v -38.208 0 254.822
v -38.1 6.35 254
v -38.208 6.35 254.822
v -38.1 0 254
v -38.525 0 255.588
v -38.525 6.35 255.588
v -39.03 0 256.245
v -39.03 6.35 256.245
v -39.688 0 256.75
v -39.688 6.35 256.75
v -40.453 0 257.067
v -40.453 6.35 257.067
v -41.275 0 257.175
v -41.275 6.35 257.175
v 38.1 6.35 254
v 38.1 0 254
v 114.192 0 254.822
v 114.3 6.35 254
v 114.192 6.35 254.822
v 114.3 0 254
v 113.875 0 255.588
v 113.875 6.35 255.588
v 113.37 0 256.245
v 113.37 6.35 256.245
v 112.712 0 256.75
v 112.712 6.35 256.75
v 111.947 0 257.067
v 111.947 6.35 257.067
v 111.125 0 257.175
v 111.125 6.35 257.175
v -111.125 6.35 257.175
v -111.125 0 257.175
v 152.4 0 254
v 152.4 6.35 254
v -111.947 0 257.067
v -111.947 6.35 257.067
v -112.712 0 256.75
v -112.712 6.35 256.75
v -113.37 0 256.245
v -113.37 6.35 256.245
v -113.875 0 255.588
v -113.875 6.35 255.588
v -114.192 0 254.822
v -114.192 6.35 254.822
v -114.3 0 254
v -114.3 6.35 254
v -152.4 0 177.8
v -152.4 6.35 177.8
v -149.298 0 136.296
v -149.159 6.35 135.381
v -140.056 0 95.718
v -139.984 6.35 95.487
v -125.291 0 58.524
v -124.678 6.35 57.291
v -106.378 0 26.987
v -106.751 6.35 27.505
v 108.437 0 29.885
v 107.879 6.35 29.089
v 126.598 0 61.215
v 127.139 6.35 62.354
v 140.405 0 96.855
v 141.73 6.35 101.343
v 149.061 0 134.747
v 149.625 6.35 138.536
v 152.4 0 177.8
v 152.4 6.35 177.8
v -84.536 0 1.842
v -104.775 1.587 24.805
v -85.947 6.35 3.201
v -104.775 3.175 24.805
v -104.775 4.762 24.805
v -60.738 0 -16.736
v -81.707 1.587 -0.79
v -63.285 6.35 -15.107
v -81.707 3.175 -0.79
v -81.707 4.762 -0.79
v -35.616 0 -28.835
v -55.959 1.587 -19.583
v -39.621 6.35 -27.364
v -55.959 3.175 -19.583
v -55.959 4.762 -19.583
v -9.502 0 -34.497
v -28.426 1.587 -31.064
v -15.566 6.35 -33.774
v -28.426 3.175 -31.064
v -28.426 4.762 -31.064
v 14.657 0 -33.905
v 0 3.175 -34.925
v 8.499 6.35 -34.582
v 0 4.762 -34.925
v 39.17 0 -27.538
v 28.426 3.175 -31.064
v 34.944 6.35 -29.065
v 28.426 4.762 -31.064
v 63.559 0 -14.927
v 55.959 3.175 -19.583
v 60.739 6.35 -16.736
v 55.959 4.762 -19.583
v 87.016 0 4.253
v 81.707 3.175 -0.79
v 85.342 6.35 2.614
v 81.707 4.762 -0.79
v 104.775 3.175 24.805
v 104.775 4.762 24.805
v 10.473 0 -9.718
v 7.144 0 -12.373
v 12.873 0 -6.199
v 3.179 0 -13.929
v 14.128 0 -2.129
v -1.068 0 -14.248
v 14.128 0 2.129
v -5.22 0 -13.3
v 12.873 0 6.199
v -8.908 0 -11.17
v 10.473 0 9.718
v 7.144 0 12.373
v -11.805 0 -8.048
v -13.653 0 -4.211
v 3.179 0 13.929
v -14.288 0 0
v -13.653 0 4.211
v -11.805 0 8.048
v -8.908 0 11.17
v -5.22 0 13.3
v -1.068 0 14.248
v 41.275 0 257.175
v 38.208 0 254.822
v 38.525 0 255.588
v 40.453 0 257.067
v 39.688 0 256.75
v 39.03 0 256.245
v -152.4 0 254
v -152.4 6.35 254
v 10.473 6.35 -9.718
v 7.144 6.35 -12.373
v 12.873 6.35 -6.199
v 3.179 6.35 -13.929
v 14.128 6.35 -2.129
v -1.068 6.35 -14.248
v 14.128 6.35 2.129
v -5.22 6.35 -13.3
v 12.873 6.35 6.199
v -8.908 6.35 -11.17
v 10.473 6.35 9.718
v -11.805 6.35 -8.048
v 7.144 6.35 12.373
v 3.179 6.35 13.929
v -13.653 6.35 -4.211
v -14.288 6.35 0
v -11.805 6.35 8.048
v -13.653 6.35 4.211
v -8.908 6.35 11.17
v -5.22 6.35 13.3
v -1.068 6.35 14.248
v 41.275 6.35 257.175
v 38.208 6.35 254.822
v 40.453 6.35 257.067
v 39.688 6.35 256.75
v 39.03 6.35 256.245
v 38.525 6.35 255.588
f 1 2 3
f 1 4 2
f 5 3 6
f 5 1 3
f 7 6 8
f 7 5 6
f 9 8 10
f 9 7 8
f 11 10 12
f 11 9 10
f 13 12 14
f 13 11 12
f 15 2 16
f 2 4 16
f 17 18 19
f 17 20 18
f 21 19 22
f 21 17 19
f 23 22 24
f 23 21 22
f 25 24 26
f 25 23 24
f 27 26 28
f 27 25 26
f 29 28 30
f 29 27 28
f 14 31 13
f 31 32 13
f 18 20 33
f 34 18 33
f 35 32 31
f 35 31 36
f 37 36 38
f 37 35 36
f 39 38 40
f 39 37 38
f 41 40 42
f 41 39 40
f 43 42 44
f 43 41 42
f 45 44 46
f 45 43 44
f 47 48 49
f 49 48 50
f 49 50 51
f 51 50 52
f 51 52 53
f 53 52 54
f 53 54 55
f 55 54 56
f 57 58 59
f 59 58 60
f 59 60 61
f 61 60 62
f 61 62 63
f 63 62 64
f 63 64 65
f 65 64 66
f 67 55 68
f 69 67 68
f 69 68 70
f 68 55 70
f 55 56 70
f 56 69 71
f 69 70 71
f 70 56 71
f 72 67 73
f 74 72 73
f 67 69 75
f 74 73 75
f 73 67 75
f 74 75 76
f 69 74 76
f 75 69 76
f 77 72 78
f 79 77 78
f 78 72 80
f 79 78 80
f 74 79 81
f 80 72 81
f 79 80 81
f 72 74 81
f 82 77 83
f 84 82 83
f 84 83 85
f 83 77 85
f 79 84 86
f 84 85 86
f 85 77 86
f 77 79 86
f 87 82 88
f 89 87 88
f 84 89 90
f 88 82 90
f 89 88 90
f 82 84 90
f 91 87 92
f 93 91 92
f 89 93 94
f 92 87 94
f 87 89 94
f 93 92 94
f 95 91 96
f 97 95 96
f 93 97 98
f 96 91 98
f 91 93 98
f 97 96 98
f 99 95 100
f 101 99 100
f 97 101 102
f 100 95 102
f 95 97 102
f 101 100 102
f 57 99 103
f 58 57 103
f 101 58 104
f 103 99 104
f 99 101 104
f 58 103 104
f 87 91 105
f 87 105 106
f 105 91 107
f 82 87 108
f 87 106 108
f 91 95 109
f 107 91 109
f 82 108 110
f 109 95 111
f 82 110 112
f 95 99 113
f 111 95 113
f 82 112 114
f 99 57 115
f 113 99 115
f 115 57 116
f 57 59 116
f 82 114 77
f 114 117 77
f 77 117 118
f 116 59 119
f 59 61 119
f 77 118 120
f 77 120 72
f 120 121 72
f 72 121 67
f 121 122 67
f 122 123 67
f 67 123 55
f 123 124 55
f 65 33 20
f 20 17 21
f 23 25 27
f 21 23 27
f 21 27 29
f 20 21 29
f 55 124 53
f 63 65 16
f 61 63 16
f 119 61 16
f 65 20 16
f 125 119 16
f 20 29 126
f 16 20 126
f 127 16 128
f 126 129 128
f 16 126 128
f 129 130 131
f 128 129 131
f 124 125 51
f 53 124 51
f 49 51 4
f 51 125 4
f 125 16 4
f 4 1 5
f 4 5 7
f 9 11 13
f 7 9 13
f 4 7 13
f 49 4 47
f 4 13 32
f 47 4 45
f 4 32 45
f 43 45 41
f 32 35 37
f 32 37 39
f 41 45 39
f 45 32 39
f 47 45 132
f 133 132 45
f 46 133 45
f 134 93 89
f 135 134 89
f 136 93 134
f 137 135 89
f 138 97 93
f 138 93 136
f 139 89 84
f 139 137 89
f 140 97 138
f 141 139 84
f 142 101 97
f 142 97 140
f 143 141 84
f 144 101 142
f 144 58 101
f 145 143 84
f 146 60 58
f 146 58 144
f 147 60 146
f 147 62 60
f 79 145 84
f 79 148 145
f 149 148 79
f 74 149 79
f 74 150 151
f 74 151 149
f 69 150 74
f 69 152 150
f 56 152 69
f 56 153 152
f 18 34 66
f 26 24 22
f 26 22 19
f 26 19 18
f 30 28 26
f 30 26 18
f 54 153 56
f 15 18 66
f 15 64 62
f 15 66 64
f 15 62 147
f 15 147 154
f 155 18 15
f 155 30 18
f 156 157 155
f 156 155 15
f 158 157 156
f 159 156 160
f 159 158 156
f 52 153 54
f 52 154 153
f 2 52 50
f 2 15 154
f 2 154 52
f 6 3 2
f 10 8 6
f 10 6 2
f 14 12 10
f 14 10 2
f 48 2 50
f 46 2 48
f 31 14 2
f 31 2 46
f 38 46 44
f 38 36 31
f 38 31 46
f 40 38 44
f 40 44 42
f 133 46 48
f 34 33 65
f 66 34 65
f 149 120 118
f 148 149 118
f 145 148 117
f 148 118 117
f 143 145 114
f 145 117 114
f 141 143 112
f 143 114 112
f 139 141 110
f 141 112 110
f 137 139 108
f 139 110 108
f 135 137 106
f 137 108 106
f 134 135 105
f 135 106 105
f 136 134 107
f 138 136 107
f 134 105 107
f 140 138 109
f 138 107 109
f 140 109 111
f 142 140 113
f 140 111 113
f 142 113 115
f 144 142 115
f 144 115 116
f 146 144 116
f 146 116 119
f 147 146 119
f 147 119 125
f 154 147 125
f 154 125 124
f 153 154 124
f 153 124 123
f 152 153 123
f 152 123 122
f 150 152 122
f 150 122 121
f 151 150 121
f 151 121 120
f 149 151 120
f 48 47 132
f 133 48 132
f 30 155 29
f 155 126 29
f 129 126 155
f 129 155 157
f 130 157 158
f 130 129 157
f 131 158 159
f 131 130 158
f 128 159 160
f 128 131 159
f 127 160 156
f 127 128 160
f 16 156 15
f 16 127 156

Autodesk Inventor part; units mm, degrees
ref_plane "YZ Plane" through (0, 0, 0) normal (1, 0, 0) x (0, 1, 0)
ref_plane "XZ Plane" through (0, 0, 0) normal (0, 1, 0) x (-1, 0, 0)
ref_plane "XY Plane" through (0, 0, 0) normal (0, 0, 1) x (1, 0, 0)
sketch "Sketch1" plane through (0, 0, 0) normal (0, 1, 0) x (-1, 0, 0)
  line L0 (0, -234.315) -> (0, 339.09) projected
  line L1 (-213.36, 0) -> (213.36, 0) projected
  line L2 (213.36, 0) -> (-213.36, 0) projected
  line L3 (0, -234.315) -> (0, 339.09) projected
  line L4 (152.4, 254) -> (-152.4, 254)
  line L5 (-152.4, 254) -> (-152.4, 0)
  line L6 (152.4, 0) -> (152.4, 254)
  arc A0 (-152.4, 0) -> (152.4, 0) centre (0, 0) ccw
  line L7 (111.125, 254) -> (41.275, 254) construction
  line L8 (111.125, 257.175) -> (41.275, 257.175)
  line L9 (41.275, 250.825) -> (111.125, 250.825)
  arc A1 (111.125, 250.825) -> (111.125, 257.175) centre (111.125, 254) ccw
  arc A2 (41.275, 257.175) -> (41.275, 250.825) centre (41.275, 254) ccw
  line L10 (-41.275, 254) -> (-111.125, 254) construction
  line L11 (-41.275, 257.175) -> (-111.125, 257.175)
  line L12 (-111.125, 250.825) -> (-41.275, 250.825)
  arc A3 (-41.275, 250.825) -> (-41.275, 257.175) centre (-41.275, 254) ccw
  arc A4 (-111.125, 257.175) -> (-111.125, 250.825) centre (-111.125, 254) ccw
  circle A5 centre (0, 0) radius 14.2875
  point P0 (76.2, 254)
  point P1 (-76.2, 254)
  point P2 (0, -152.4)
  point P3 (114.3, 254)
  point P4 (38.1, 254)
  dimension "d2" = 69.85
  dimension "d3" = 6.35
  dimension "d4" = 69.85
  dimension "d5" = 6.35
  dimension "d7" = 76.2
  dimension "d8" = 304.8
  dimension "d9" = 76.2
  dimension "d10" = 28.575
  dimension "d11" = 406.4
  dimension "d15" = 76.2
extrude "Extrusion1" add sketch "Sketch1" along normal blind 6.35 contours A0 L1 A5 L0 | L0 A5 L1 A0 | L5 L4 A4 L12 A3 L0 A5 L1 | L1 A5 L0 L4 A2 L9 A1 L6 | A4 L11 A3 L4 | L4 A3 L12 A4 | A1 L9 A2 L4 | L4 A2 L8 A1
sketch "Sketch5" plane through (0, 6.35, 0) normal (0, 1, 0) x (1, 0, 0)
  circle A0 centre (0, 0) radius 14.2875 projected
  line L0 (-38.1, -254) -> (38.1, -254) projected
  arc A1 (38.1, -254) -> (41.275, -257.175) centre (41.275, -254) ccw projected
  line L1 (41.275, -257.175) -> (111.125, -257.175) projected
  arc A2 (111.125, -257.175) -> (114.3, -254) centre (111.125, -254) ccw projected
  line L2 (114.3, -254) -> (152.4, -254) projected
  line L3 (152.4, -254) -> (152.4, 0) projected
  arc A3 (152.4, 0) -> (-152.4, 0) centre (0, 0) ccw projected
  line L4 (-152.4, 0) -> (-152.4, -254) projected
  line L5 (-152.4, -254) -> (-114.3, -254) projected
  arc A4 (-114.3, -254) -> (-111.125, -257.175) centre (-111.125, -254) ccw projected
  line L6 (-111.125, -257.175) -> (-41.275, -257.175) projected
  arc A5 (-41.275, -257.175) -> (-38.1, -254) centre (-41.275, -254) ccw projected
  line L7 (-152.4, -254) -> (152.4, -254)
  line L8 (152.4, -254) -> (152.4, -177.8)
  line L9 (152.4, -177.8) -> (-152.4, -177.8)
  line L10 (-152.4, -177.8) -> (-152.4, -254)
  line L11 (-152.4, -177.8) -> (152.4, -177.8)
  line L12 (152.4, -177.8) -> (152.4, 0)
  line L13 (-152.4, 0) -> (-152.4, -177.8)
  arc A6 (152.4, 0) -> (-152.4, 0) centre (0, 0) ccw
  line L14 (-152.4, 0) -> (-152.4, -254) projected
  line L15 (-152.4, -177.8) -> (-152.4, 0) construction
  line L16 (-152.4, 0) -> (0, 152.4) construction
  line L17 (0, 152.4) -> (152.4, 0) construction
  line L18 (152.4, 0) -> (152.4, -177.8) construction
  line L19 (152.4, -254) -> (152.4, 0) projected
  spline S0 degree 4 poles (-152.4, -177.8) (-152.4, 0) (0, 152.4) (152.4, 0) (152.4, -177.8) knots 1 1 1 1 1 2 2 2 2 2
  dimension "d20" = 304.8
  dimension "d21" = 76.2
extrude "Extrusion2" cut sketch "Sketch5" against normal blind 25.4 contours L4 A3 L3 S0
properties part number "turretSidePlateTwo"
